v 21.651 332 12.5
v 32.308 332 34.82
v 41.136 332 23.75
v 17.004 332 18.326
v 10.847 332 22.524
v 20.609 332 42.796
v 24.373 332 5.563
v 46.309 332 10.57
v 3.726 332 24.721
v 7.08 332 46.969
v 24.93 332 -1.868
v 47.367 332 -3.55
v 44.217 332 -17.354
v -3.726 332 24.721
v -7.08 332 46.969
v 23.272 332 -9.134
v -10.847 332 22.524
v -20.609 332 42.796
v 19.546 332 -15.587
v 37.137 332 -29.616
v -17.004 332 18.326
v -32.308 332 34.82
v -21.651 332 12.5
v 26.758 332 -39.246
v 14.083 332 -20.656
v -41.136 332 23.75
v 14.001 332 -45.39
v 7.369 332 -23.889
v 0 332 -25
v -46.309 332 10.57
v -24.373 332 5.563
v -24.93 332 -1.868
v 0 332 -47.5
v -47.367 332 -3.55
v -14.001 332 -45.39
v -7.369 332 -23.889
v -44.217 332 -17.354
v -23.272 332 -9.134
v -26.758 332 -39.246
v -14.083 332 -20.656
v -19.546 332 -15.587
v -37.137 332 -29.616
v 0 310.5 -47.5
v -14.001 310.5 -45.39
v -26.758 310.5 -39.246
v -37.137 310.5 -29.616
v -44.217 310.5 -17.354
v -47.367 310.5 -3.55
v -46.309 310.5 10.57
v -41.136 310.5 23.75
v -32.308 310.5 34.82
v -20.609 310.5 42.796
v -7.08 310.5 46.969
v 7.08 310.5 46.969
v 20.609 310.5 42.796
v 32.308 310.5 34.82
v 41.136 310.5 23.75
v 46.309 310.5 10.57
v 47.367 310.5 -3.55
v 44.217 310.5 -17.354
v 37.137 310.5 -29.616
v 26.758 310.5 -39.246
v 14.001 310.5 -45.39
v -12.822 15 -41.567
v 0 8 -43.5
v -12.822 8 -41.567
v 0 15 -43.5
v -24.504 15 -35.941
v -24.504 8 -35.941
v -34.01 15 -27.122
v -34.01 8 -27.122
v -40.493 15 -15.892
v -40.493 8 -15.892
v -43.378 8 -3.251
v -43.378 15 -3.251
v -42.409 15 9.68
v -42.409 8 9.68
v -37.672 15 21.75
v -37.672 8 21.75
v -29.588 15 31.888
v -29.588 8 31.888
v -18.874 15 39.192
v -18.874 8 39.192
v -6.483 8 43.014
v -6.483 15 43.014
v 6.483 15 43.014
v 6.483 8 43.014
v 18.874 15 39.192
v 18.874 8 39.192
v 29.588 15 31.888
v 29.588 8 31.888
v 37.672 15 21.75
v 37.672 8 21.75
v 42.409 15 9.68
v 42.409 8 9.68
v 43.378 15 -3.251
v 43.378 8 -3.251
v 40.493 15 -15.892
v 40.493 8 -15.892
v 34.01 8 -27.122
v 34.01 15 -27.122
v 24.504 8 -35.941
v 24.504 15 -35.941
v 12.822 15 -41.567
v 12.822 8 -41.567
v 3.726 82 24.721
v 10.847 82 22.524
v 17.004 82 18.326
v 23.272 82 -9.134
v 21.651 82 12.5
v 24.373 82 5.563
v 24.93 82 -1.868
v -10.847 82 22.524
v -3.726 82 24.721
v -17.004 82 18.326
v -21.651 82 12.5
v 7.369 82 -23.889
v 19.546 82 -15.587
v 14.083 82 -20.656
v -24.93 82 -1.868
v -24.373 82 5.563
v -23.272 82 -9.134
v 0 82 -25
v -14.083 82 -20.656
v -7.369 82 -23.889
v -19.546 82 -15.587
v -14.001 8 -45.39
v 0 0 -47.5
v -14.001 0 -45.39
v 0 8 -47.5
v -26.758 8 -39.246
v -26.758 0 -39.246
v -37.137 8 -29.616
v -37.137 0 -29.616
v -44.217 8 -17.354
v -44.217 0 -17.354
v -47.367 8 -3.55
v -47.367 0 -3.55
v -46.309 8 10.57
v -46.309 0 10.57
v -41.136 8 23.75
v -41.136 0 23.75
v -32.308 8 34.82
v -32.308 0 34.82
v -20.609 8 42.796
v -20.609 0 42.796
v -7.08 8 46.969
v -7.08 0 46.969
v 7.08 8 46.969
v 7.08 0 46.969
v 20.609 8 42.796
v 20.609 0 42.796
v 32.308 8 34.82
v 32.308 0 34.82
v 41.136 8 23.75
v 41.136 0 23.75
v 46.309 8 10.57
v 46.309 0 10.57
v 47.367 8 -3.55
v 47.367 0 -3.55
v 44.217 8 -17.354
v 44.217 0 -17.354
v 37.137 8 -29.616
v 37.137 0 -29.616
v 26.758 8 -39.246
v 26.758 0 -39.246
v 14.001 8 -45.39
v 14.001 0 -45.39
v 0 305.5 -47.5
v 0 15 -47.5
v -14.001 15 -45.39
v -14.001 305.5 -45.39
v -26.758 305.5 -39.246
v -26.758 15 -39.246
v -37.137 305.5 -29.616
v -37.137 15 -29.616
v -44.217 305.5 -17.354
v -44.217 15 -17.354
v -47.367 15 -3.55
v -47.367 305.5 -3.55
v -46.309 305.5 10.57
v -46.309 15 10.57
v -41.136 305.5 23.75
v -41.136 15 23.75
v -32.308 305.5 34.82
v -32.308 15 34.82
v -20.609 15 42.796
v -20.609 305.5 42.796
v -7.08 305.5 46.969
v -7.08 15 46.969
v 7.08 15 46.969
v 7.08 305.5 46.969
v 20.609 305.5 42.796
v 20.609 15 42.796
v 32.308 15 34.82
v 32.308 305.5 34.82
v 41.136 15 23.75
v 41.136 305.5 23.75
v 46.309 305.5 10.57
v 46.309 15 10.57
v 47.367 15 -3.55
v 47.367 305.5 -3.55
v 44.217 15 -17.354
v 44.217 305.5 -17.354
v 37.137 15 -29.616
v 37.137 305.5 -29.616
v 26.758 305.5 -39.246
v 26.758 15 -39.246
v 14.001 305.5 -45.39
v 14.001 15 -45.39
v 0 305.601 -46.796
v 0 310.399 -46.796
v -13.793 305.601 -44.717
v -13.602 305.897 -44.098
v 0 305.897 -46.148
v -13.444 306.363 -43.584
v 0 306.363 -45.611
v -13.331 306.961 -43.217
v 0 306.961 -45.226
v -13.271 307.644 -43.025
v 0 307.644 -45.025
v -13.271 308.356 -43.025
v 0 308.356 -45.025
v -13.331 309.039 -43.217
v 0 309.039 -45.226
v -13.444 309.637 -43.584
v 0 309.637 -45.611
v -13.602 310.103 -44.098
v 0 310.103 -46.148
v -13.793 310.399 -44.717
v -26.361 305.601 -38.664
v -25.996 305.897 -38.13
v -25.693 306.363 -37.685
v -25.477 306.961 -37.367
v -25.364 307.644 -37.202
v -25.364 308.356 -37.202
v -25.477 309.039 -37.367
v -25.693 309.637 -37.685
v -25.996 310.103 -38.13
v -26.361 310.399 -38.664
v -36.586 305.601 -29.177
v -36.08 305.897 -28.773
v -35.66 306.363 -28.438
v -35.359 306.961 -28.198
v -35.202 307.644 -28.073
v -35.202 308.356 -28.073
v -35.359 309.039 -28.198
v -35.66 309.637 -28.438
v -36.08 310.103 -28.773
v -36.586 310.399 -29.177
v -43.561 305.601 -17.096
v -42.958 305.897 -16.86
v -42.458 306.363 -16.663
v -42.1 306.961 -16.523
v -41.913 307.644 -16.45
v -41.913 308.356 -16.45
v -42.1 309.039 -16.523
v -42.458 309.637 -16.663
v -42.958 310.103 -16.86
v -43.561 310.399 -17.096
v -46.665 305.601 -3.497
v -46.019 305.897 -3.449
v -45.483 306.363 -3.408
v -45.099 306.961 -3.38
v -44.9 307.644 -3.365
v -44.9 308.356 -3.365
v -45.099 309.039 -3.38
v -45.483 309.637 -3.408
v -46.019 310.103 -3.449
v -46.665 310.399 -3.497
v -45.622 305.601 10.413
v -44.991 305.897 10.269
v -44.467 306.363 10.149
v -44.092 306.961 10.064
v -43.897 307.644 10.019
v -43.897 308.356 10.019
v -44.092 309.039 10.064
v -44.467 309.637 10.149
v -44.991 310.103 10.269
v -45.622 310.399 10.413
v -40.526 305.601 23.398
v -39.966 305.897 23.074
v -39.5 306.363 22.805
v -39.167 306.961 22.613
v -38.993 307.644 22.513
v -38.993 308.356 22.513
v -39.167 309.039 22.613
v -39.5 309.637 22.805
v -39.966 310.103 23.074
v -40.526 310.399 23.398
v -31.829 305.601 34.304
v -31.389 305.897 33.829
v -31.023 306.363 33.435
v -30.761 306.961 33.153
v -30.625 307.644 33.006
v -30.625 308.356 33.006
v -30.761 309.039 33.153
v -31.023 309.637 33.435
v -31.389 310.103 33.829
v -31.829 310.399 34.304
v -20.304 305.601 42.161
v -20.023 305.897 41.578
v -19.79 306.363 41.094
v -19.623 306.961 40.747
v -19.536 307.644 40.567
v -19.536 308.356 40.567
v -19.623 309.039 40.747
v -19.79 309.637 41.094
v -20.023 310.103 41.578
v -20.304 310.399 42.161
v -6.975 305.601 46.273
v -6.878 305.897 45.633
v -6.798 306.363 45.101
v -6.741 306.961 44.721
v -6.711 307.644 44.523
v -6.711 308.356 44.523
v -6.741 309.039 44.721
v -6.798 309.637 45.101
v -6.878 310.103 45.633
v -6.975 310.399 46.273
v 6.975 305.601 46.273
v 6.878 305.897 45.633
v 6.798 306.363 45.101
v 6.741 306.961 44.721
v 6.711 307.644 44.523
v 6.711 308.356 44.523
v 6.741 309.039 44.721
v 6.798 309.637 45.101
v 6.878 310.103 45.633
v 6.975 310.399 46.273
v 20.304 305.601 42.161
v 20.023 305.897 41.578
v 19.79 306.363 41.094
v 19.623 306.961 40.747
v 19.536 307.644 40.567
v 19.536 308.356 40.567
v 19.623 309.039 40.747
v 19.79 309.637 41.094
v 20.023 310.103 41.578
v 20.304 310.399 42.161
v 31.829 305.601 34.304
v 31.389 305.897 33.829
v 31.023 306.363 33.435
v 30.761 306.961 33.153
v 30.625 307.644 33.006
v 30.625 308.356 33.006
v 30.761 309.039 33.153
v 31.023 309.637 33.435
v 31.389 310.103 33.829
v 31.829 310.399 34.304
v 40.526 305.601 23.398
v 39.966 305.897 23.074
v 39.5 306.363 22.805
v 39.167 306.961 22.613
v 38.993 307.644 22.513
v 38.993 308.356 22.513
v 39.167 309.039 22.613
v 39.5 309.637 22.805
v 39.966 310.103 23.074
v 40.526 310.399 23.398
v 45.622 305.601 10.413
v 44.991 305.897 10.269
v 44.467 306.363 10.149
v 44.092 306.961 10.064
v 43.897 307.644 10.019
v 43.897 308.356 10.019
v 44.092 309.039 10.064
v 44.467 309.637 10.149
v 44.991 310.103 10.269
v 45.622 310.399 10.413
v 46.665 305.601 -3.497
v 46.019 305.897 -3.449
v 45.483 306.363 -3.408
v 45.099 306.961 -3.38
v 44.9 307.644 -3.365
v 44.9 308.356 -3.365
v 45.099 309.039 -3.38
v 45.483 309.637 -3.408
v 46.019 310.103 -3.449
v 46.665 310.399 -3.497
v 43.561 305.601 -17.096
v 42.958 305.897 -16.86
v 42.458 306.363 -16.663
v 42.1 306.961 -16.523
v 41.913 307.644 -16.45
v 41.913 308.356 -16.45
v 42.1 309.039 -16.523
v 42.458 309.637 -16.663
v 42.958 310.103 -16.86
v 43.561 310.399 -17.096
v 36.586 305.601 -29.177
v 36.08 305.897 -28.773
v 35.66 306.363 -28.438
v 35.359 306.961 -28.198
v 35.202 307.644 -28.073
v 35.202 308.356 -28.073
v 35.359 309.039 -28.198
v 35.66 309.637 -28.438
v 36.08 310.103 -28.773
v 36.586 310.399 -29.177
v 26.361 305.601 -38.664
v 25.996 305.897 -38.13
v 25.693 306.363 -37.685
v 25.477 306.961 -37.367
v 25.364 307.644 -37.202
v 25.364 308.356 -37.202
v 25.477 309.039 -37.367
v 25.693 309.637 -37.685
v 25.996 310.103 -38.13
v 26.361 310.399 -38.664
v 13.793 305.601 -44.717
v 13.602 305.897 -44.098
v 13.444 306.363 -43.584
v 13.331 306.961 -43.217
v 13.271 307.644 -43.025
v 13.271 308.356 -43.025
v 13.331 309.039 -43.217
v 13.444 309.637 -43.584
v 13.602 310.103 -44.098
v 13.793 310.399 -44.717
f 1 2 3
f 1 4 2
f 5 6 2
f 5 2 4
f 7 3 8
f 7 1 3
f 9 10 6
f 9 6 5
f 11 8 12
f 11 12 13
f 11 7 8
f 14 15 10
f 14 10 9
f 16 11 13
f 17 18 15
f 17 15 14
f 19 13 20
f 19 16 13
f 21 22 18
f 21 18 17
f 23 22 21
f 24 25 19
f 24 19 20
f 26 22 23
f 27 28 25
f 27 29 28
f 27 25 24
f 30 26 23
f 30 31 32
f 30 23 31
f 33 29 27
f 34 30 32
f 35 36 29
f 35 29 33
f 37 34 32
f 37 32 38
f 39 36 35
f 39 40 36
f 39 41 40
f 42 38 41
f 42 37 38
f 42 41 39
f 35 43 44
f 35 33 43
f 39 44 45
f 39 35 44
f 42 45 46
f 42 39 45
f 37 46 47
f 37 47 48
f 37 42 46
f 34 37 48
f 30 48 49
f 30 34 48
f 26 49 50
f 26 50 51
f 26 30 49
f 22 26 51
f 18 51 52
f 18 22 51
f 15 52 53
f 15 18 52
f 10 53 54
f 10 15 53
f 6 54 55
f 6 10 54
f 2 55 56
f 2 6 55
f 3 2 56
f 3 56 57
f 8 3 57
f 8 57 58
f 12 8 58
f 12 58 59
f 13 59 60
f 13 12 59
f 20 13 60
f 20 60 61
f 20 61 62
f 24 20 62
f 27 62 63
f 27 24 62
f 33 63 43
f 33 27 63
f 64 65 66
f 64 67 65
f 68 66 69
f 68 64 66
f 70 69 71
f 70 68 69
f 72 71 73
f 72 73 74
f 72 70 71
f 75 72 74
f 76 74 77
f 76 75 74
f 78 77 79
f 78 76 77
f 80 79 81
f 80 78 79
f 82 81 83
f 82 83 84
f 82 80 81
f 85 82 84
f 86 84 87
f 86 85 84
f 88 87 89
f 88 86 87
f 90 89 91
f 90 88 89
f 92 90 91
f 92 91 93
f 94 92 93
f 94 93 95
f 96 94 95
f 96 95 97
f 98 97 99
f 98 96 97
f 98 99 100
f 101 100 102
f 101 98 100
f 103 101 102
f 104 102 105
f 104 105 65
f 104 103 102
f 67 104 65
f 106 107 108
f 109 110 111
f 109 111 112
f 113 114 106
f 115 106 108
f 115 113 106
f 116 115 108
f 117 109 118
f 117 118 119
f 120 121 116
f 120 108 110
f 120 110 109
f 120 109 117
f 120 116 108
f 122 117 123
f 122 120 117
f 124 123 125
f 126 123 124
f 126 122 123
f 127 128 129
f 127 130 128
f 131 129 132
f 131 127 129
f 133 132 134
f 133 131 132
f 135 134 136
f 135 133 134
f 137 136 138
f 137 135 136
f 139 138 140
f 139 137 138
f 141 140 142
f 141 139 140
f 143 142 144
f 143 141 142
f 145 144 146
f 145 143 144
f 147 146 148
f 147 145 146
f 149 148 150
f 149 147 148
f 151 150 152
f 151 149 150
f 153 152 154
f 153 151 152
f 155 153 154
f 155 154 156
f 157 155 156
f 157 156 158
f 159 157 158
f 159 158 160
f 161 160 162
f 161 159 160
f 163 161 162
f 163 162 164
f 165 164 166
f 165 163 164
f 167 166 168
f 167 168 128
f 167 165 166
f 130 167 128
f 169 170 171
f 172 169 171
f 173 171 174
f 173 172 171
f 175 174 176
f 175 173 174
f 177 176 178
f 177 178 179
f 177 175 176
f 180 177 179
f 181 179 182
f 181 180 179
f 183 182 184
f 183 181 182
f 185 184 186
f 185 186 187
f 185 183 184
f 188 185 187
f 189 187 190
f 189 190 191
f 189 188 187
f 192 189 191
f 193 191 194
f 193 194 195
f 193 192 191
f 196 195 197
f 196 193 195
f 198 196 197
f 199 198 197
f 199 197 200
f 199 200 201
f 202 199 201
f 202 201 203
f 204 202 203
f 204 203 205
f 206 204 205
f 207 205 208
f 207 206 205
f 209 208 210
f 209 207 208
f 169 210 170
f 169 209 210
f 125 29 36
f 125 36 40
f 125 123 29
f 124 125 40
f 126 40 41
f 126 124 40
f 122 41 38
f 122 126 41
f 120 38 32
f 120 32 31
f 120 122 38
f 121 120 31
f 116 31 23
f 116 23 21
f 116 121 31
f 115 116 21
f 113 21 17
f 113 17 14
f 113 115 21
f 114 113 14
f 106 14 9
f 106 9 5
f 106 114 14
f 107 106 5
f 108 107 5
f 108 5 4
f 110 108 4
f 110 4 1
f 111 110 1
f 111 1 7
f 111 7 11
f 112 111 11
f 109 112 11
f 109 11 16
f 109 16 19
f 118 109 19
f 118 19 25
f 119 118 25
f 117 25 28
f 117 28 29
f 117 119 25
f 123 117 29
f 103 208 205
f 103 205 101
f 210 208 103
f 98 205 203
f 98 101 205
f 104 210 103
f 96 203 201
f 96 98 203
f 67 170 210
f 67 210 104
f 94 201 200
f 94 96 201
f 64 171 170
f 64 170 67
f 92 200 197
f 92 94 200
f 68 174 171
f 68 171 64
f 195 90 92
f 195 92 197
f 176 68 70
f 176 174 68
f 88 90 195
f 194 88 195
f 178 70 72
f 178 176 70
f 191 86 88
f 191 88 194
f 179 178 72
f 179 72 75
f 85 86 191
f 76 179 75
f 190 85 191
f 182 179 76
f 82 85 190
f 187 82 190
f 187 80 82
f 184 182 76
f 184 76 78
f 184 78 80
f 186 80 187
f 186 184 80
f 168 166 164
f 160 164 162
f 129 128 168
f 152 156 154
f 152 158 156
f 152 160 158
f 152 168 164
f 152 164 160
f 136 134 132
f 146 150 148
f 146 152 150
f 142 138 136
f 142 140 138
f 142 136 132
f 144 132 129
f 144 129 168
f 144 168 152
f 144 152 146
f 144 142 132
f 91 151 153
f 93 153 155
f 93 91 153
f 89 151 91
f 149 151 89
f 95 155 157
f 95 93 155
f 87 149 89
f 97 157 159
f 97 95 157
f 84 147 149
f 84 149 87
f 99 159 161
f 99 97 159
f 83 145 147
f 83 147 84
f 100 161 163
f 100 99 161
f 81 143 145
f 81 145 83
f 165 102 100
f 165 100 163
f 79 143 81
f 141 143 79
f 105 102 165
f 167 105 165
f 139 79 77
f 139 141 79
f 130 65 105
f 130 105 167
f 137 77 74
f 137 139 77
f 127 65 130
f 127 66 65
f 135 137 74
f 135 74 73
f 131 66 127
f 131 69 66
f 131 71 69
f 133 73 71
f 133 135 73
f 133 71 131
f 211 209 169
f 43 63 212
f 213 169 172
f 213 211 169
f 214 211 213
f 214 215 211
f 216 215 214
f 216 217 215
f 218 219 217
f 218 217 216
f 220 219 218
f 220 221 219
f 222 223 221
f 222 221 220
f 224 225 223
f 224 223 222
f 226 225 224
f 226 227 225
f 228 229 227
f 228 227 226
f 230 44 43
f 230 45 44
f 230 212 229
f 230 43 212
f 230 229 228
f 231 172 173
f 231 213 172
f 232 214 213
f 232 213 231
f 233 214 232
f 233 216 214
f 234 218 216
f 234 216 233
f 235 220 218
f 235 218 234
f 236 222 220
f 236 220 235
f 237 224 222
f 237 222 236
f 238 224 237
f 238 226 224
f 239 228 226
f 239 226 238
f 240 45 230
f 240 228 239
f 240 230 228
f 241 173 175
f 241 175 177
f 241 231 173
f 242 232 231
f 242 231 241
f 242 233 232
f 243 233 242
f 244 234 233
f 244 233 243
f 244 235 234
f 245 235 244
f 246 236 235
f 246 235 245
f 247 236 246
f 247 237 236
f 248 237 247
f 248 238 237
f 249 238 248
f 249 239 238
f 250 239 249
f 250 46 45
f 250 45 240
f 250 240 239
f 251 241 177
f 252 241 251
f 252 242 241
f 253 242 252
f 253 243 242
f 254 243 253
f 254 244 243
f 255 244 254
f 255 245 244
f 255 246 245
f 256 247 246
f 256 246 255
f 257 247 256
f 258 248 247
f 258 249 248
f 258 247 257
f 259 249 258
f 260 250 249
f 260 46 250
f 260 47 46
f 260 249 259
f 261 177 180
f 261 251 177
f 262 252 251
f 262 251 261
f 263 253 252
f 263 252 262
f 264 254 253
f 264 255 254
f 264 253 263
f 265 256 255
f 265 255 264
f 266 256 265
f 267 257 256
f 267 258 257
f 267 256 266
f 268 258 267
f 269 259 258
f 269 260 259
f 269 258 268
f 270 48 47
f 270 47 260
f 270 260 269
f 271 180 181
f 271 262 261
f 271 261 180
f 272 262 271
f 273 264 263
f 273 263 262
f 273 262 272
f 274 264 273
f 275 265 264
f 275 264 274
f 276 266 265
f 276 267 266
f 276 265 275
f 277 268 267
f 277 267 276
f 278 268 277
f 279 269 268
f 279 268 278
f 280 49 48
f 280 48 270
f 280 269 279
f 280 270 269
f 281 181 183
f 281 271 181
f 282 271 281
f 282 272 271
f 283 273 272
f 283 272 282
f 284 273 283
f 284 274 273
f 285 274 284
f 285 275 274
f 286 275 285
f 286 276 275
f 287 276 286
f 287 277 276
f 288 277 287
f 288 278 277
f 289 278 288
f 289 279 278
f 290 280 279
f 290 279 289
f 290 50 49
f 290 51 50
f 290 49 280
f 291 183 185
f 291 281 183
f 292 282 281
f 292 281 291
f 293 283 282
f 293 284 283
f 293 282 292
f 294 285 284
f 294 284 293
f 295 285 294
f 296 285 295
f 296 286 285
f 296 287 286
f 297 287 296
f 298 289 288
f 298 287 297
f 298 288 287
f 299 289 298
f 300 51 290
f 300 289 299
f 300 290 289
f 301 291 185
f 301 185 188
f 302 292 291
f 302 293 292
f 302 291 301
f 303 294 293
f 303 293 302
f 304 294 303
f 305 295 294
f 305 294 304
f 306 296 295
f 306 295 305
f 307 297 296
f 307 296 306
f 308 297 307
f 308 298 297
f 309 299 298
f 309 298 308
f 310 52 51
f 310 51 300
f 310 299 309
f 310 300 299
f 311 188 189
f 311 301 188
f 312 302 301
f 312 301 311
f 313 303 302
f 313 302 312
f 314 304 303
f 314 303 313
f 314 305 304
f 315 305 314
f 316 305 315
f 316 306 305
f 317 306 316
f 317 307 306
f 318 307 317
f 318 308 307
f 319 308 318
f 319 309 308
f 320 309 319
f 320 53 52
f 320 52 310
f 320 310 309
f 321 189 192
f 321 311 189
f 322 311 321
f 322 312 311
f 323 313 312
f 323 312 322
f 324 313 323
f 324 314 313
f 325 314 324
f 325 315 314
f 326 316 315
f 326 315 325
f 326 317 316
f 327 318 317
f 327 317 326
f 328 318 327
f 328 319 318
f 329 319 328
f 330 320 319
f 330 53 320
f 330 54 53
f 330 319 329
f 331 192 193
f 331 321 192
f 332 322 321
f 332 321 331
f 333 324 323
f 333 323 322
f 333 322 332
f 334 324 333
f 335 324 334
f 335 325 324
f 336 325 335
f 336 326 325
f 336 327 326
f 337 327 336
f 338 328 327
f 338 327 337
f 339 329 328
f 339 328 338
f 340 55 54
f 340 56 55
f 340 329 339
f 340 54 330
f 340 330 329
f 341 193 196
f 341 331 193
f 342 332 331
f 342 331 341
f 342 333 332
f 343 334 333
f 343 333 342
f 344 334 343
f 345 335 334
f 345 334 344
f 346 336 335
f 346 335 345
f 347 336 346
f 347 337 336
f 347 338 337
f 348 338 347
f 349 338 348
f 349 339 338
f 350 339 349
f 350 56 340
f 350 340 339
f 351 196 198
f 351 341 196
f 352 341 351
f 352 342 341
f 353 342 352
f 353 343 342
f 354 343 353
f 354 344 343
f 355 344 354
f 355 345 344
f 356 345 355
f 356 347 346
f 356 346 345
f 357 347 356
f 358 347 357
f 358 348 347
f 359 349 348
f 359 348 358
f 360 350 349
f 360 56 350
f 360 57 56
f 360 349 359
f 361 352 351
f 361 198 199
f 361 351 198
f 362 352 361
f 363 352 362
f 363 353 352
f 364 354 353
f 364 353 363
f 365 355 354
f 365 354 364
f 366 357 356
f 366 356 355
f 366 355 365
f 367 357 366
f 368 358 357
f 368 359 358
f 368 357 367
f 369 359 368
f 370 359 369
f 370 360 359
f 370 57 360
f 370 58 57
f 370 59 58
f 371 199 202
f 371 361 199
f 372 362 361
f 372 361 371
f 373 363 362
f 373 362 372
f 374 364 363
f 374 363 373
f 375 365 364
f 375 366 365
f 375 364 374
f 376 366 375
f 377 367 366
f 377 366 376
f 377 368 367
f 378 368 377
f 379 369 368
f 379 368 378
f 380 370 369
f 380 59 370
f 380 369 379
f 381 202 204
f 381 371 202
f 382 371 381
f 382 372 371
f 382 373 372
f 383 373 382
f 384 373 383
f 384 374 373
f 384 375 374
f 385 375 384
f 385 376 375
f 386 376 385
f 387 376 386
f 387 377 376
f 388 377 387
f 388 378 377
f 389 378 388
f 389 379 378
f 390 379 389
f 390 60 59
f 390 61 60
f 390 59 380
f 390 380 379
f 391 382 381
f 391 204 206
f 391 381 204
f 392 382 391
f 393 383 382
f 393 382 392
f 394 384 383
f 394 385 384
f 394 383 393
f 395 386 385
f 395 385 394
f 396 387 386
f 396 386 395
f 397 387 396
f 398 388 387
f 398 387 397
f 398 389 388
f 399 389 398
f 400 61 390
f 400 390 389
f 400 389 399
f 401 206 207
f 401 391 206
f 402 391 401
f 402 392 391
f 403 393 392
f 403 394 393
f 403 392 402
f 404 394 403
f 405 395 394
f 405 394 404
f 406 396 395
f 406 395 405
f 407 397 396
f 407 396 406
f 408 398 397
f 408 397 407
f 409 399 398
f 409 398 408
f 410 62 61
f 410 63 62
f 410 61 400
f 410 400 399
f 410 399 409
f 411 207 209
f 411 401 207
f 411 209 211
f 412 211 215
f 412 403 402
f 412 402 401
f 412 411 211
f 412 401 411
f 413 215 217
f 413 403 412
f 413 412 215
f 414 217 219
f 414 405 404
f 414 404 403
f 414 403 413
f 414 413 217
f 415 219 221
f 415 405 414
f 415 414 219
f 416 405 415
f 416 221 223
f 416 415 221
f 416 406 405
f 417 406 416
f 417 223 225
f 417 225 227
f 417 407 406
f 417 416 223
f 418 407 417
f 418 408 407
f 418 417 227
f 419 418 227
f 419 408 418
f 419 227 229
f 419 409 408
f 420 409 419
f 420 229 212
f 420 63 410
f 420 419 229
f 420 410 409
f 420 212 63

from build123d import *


with BuildPart() as part:
    # Sketch1 → Revolve1 (revolve)
    with BuildSketch(Plane.XY, mode=Mode.PRIVATE) as revolve1_sk:
        with BuildLine():
            Line((0, 0), (47.5, 0))
            Line((47.5, 0), (47.5, 8))
            Line((47.5, 8), (43.5, 8))
            Line((43.5, 8), (43.5, 15))
            Line((43.5, 15), (47.5, 15))
            Line((47.5, 15), (47.5, 305.5))
            ThreePointArc((47.5, 305.5), (45, 308), (47.5, 310.5))
            Line((47.5, 310.5), (47.5, 332))
            Line((47.5, 332), (25, 332))
            Line((25, 332), (25, 82))
            Line((25, 82), (0, 82))
            Line((0, 82), (0, 0))
        make_face()
    revolve(revolve1_sk.sketch.rotate(Axis((0, 0, 0), (0, 1, 0)), 90), axis=Axis((0, 0, 0), (0, 1, 0)))


solid = part.part
